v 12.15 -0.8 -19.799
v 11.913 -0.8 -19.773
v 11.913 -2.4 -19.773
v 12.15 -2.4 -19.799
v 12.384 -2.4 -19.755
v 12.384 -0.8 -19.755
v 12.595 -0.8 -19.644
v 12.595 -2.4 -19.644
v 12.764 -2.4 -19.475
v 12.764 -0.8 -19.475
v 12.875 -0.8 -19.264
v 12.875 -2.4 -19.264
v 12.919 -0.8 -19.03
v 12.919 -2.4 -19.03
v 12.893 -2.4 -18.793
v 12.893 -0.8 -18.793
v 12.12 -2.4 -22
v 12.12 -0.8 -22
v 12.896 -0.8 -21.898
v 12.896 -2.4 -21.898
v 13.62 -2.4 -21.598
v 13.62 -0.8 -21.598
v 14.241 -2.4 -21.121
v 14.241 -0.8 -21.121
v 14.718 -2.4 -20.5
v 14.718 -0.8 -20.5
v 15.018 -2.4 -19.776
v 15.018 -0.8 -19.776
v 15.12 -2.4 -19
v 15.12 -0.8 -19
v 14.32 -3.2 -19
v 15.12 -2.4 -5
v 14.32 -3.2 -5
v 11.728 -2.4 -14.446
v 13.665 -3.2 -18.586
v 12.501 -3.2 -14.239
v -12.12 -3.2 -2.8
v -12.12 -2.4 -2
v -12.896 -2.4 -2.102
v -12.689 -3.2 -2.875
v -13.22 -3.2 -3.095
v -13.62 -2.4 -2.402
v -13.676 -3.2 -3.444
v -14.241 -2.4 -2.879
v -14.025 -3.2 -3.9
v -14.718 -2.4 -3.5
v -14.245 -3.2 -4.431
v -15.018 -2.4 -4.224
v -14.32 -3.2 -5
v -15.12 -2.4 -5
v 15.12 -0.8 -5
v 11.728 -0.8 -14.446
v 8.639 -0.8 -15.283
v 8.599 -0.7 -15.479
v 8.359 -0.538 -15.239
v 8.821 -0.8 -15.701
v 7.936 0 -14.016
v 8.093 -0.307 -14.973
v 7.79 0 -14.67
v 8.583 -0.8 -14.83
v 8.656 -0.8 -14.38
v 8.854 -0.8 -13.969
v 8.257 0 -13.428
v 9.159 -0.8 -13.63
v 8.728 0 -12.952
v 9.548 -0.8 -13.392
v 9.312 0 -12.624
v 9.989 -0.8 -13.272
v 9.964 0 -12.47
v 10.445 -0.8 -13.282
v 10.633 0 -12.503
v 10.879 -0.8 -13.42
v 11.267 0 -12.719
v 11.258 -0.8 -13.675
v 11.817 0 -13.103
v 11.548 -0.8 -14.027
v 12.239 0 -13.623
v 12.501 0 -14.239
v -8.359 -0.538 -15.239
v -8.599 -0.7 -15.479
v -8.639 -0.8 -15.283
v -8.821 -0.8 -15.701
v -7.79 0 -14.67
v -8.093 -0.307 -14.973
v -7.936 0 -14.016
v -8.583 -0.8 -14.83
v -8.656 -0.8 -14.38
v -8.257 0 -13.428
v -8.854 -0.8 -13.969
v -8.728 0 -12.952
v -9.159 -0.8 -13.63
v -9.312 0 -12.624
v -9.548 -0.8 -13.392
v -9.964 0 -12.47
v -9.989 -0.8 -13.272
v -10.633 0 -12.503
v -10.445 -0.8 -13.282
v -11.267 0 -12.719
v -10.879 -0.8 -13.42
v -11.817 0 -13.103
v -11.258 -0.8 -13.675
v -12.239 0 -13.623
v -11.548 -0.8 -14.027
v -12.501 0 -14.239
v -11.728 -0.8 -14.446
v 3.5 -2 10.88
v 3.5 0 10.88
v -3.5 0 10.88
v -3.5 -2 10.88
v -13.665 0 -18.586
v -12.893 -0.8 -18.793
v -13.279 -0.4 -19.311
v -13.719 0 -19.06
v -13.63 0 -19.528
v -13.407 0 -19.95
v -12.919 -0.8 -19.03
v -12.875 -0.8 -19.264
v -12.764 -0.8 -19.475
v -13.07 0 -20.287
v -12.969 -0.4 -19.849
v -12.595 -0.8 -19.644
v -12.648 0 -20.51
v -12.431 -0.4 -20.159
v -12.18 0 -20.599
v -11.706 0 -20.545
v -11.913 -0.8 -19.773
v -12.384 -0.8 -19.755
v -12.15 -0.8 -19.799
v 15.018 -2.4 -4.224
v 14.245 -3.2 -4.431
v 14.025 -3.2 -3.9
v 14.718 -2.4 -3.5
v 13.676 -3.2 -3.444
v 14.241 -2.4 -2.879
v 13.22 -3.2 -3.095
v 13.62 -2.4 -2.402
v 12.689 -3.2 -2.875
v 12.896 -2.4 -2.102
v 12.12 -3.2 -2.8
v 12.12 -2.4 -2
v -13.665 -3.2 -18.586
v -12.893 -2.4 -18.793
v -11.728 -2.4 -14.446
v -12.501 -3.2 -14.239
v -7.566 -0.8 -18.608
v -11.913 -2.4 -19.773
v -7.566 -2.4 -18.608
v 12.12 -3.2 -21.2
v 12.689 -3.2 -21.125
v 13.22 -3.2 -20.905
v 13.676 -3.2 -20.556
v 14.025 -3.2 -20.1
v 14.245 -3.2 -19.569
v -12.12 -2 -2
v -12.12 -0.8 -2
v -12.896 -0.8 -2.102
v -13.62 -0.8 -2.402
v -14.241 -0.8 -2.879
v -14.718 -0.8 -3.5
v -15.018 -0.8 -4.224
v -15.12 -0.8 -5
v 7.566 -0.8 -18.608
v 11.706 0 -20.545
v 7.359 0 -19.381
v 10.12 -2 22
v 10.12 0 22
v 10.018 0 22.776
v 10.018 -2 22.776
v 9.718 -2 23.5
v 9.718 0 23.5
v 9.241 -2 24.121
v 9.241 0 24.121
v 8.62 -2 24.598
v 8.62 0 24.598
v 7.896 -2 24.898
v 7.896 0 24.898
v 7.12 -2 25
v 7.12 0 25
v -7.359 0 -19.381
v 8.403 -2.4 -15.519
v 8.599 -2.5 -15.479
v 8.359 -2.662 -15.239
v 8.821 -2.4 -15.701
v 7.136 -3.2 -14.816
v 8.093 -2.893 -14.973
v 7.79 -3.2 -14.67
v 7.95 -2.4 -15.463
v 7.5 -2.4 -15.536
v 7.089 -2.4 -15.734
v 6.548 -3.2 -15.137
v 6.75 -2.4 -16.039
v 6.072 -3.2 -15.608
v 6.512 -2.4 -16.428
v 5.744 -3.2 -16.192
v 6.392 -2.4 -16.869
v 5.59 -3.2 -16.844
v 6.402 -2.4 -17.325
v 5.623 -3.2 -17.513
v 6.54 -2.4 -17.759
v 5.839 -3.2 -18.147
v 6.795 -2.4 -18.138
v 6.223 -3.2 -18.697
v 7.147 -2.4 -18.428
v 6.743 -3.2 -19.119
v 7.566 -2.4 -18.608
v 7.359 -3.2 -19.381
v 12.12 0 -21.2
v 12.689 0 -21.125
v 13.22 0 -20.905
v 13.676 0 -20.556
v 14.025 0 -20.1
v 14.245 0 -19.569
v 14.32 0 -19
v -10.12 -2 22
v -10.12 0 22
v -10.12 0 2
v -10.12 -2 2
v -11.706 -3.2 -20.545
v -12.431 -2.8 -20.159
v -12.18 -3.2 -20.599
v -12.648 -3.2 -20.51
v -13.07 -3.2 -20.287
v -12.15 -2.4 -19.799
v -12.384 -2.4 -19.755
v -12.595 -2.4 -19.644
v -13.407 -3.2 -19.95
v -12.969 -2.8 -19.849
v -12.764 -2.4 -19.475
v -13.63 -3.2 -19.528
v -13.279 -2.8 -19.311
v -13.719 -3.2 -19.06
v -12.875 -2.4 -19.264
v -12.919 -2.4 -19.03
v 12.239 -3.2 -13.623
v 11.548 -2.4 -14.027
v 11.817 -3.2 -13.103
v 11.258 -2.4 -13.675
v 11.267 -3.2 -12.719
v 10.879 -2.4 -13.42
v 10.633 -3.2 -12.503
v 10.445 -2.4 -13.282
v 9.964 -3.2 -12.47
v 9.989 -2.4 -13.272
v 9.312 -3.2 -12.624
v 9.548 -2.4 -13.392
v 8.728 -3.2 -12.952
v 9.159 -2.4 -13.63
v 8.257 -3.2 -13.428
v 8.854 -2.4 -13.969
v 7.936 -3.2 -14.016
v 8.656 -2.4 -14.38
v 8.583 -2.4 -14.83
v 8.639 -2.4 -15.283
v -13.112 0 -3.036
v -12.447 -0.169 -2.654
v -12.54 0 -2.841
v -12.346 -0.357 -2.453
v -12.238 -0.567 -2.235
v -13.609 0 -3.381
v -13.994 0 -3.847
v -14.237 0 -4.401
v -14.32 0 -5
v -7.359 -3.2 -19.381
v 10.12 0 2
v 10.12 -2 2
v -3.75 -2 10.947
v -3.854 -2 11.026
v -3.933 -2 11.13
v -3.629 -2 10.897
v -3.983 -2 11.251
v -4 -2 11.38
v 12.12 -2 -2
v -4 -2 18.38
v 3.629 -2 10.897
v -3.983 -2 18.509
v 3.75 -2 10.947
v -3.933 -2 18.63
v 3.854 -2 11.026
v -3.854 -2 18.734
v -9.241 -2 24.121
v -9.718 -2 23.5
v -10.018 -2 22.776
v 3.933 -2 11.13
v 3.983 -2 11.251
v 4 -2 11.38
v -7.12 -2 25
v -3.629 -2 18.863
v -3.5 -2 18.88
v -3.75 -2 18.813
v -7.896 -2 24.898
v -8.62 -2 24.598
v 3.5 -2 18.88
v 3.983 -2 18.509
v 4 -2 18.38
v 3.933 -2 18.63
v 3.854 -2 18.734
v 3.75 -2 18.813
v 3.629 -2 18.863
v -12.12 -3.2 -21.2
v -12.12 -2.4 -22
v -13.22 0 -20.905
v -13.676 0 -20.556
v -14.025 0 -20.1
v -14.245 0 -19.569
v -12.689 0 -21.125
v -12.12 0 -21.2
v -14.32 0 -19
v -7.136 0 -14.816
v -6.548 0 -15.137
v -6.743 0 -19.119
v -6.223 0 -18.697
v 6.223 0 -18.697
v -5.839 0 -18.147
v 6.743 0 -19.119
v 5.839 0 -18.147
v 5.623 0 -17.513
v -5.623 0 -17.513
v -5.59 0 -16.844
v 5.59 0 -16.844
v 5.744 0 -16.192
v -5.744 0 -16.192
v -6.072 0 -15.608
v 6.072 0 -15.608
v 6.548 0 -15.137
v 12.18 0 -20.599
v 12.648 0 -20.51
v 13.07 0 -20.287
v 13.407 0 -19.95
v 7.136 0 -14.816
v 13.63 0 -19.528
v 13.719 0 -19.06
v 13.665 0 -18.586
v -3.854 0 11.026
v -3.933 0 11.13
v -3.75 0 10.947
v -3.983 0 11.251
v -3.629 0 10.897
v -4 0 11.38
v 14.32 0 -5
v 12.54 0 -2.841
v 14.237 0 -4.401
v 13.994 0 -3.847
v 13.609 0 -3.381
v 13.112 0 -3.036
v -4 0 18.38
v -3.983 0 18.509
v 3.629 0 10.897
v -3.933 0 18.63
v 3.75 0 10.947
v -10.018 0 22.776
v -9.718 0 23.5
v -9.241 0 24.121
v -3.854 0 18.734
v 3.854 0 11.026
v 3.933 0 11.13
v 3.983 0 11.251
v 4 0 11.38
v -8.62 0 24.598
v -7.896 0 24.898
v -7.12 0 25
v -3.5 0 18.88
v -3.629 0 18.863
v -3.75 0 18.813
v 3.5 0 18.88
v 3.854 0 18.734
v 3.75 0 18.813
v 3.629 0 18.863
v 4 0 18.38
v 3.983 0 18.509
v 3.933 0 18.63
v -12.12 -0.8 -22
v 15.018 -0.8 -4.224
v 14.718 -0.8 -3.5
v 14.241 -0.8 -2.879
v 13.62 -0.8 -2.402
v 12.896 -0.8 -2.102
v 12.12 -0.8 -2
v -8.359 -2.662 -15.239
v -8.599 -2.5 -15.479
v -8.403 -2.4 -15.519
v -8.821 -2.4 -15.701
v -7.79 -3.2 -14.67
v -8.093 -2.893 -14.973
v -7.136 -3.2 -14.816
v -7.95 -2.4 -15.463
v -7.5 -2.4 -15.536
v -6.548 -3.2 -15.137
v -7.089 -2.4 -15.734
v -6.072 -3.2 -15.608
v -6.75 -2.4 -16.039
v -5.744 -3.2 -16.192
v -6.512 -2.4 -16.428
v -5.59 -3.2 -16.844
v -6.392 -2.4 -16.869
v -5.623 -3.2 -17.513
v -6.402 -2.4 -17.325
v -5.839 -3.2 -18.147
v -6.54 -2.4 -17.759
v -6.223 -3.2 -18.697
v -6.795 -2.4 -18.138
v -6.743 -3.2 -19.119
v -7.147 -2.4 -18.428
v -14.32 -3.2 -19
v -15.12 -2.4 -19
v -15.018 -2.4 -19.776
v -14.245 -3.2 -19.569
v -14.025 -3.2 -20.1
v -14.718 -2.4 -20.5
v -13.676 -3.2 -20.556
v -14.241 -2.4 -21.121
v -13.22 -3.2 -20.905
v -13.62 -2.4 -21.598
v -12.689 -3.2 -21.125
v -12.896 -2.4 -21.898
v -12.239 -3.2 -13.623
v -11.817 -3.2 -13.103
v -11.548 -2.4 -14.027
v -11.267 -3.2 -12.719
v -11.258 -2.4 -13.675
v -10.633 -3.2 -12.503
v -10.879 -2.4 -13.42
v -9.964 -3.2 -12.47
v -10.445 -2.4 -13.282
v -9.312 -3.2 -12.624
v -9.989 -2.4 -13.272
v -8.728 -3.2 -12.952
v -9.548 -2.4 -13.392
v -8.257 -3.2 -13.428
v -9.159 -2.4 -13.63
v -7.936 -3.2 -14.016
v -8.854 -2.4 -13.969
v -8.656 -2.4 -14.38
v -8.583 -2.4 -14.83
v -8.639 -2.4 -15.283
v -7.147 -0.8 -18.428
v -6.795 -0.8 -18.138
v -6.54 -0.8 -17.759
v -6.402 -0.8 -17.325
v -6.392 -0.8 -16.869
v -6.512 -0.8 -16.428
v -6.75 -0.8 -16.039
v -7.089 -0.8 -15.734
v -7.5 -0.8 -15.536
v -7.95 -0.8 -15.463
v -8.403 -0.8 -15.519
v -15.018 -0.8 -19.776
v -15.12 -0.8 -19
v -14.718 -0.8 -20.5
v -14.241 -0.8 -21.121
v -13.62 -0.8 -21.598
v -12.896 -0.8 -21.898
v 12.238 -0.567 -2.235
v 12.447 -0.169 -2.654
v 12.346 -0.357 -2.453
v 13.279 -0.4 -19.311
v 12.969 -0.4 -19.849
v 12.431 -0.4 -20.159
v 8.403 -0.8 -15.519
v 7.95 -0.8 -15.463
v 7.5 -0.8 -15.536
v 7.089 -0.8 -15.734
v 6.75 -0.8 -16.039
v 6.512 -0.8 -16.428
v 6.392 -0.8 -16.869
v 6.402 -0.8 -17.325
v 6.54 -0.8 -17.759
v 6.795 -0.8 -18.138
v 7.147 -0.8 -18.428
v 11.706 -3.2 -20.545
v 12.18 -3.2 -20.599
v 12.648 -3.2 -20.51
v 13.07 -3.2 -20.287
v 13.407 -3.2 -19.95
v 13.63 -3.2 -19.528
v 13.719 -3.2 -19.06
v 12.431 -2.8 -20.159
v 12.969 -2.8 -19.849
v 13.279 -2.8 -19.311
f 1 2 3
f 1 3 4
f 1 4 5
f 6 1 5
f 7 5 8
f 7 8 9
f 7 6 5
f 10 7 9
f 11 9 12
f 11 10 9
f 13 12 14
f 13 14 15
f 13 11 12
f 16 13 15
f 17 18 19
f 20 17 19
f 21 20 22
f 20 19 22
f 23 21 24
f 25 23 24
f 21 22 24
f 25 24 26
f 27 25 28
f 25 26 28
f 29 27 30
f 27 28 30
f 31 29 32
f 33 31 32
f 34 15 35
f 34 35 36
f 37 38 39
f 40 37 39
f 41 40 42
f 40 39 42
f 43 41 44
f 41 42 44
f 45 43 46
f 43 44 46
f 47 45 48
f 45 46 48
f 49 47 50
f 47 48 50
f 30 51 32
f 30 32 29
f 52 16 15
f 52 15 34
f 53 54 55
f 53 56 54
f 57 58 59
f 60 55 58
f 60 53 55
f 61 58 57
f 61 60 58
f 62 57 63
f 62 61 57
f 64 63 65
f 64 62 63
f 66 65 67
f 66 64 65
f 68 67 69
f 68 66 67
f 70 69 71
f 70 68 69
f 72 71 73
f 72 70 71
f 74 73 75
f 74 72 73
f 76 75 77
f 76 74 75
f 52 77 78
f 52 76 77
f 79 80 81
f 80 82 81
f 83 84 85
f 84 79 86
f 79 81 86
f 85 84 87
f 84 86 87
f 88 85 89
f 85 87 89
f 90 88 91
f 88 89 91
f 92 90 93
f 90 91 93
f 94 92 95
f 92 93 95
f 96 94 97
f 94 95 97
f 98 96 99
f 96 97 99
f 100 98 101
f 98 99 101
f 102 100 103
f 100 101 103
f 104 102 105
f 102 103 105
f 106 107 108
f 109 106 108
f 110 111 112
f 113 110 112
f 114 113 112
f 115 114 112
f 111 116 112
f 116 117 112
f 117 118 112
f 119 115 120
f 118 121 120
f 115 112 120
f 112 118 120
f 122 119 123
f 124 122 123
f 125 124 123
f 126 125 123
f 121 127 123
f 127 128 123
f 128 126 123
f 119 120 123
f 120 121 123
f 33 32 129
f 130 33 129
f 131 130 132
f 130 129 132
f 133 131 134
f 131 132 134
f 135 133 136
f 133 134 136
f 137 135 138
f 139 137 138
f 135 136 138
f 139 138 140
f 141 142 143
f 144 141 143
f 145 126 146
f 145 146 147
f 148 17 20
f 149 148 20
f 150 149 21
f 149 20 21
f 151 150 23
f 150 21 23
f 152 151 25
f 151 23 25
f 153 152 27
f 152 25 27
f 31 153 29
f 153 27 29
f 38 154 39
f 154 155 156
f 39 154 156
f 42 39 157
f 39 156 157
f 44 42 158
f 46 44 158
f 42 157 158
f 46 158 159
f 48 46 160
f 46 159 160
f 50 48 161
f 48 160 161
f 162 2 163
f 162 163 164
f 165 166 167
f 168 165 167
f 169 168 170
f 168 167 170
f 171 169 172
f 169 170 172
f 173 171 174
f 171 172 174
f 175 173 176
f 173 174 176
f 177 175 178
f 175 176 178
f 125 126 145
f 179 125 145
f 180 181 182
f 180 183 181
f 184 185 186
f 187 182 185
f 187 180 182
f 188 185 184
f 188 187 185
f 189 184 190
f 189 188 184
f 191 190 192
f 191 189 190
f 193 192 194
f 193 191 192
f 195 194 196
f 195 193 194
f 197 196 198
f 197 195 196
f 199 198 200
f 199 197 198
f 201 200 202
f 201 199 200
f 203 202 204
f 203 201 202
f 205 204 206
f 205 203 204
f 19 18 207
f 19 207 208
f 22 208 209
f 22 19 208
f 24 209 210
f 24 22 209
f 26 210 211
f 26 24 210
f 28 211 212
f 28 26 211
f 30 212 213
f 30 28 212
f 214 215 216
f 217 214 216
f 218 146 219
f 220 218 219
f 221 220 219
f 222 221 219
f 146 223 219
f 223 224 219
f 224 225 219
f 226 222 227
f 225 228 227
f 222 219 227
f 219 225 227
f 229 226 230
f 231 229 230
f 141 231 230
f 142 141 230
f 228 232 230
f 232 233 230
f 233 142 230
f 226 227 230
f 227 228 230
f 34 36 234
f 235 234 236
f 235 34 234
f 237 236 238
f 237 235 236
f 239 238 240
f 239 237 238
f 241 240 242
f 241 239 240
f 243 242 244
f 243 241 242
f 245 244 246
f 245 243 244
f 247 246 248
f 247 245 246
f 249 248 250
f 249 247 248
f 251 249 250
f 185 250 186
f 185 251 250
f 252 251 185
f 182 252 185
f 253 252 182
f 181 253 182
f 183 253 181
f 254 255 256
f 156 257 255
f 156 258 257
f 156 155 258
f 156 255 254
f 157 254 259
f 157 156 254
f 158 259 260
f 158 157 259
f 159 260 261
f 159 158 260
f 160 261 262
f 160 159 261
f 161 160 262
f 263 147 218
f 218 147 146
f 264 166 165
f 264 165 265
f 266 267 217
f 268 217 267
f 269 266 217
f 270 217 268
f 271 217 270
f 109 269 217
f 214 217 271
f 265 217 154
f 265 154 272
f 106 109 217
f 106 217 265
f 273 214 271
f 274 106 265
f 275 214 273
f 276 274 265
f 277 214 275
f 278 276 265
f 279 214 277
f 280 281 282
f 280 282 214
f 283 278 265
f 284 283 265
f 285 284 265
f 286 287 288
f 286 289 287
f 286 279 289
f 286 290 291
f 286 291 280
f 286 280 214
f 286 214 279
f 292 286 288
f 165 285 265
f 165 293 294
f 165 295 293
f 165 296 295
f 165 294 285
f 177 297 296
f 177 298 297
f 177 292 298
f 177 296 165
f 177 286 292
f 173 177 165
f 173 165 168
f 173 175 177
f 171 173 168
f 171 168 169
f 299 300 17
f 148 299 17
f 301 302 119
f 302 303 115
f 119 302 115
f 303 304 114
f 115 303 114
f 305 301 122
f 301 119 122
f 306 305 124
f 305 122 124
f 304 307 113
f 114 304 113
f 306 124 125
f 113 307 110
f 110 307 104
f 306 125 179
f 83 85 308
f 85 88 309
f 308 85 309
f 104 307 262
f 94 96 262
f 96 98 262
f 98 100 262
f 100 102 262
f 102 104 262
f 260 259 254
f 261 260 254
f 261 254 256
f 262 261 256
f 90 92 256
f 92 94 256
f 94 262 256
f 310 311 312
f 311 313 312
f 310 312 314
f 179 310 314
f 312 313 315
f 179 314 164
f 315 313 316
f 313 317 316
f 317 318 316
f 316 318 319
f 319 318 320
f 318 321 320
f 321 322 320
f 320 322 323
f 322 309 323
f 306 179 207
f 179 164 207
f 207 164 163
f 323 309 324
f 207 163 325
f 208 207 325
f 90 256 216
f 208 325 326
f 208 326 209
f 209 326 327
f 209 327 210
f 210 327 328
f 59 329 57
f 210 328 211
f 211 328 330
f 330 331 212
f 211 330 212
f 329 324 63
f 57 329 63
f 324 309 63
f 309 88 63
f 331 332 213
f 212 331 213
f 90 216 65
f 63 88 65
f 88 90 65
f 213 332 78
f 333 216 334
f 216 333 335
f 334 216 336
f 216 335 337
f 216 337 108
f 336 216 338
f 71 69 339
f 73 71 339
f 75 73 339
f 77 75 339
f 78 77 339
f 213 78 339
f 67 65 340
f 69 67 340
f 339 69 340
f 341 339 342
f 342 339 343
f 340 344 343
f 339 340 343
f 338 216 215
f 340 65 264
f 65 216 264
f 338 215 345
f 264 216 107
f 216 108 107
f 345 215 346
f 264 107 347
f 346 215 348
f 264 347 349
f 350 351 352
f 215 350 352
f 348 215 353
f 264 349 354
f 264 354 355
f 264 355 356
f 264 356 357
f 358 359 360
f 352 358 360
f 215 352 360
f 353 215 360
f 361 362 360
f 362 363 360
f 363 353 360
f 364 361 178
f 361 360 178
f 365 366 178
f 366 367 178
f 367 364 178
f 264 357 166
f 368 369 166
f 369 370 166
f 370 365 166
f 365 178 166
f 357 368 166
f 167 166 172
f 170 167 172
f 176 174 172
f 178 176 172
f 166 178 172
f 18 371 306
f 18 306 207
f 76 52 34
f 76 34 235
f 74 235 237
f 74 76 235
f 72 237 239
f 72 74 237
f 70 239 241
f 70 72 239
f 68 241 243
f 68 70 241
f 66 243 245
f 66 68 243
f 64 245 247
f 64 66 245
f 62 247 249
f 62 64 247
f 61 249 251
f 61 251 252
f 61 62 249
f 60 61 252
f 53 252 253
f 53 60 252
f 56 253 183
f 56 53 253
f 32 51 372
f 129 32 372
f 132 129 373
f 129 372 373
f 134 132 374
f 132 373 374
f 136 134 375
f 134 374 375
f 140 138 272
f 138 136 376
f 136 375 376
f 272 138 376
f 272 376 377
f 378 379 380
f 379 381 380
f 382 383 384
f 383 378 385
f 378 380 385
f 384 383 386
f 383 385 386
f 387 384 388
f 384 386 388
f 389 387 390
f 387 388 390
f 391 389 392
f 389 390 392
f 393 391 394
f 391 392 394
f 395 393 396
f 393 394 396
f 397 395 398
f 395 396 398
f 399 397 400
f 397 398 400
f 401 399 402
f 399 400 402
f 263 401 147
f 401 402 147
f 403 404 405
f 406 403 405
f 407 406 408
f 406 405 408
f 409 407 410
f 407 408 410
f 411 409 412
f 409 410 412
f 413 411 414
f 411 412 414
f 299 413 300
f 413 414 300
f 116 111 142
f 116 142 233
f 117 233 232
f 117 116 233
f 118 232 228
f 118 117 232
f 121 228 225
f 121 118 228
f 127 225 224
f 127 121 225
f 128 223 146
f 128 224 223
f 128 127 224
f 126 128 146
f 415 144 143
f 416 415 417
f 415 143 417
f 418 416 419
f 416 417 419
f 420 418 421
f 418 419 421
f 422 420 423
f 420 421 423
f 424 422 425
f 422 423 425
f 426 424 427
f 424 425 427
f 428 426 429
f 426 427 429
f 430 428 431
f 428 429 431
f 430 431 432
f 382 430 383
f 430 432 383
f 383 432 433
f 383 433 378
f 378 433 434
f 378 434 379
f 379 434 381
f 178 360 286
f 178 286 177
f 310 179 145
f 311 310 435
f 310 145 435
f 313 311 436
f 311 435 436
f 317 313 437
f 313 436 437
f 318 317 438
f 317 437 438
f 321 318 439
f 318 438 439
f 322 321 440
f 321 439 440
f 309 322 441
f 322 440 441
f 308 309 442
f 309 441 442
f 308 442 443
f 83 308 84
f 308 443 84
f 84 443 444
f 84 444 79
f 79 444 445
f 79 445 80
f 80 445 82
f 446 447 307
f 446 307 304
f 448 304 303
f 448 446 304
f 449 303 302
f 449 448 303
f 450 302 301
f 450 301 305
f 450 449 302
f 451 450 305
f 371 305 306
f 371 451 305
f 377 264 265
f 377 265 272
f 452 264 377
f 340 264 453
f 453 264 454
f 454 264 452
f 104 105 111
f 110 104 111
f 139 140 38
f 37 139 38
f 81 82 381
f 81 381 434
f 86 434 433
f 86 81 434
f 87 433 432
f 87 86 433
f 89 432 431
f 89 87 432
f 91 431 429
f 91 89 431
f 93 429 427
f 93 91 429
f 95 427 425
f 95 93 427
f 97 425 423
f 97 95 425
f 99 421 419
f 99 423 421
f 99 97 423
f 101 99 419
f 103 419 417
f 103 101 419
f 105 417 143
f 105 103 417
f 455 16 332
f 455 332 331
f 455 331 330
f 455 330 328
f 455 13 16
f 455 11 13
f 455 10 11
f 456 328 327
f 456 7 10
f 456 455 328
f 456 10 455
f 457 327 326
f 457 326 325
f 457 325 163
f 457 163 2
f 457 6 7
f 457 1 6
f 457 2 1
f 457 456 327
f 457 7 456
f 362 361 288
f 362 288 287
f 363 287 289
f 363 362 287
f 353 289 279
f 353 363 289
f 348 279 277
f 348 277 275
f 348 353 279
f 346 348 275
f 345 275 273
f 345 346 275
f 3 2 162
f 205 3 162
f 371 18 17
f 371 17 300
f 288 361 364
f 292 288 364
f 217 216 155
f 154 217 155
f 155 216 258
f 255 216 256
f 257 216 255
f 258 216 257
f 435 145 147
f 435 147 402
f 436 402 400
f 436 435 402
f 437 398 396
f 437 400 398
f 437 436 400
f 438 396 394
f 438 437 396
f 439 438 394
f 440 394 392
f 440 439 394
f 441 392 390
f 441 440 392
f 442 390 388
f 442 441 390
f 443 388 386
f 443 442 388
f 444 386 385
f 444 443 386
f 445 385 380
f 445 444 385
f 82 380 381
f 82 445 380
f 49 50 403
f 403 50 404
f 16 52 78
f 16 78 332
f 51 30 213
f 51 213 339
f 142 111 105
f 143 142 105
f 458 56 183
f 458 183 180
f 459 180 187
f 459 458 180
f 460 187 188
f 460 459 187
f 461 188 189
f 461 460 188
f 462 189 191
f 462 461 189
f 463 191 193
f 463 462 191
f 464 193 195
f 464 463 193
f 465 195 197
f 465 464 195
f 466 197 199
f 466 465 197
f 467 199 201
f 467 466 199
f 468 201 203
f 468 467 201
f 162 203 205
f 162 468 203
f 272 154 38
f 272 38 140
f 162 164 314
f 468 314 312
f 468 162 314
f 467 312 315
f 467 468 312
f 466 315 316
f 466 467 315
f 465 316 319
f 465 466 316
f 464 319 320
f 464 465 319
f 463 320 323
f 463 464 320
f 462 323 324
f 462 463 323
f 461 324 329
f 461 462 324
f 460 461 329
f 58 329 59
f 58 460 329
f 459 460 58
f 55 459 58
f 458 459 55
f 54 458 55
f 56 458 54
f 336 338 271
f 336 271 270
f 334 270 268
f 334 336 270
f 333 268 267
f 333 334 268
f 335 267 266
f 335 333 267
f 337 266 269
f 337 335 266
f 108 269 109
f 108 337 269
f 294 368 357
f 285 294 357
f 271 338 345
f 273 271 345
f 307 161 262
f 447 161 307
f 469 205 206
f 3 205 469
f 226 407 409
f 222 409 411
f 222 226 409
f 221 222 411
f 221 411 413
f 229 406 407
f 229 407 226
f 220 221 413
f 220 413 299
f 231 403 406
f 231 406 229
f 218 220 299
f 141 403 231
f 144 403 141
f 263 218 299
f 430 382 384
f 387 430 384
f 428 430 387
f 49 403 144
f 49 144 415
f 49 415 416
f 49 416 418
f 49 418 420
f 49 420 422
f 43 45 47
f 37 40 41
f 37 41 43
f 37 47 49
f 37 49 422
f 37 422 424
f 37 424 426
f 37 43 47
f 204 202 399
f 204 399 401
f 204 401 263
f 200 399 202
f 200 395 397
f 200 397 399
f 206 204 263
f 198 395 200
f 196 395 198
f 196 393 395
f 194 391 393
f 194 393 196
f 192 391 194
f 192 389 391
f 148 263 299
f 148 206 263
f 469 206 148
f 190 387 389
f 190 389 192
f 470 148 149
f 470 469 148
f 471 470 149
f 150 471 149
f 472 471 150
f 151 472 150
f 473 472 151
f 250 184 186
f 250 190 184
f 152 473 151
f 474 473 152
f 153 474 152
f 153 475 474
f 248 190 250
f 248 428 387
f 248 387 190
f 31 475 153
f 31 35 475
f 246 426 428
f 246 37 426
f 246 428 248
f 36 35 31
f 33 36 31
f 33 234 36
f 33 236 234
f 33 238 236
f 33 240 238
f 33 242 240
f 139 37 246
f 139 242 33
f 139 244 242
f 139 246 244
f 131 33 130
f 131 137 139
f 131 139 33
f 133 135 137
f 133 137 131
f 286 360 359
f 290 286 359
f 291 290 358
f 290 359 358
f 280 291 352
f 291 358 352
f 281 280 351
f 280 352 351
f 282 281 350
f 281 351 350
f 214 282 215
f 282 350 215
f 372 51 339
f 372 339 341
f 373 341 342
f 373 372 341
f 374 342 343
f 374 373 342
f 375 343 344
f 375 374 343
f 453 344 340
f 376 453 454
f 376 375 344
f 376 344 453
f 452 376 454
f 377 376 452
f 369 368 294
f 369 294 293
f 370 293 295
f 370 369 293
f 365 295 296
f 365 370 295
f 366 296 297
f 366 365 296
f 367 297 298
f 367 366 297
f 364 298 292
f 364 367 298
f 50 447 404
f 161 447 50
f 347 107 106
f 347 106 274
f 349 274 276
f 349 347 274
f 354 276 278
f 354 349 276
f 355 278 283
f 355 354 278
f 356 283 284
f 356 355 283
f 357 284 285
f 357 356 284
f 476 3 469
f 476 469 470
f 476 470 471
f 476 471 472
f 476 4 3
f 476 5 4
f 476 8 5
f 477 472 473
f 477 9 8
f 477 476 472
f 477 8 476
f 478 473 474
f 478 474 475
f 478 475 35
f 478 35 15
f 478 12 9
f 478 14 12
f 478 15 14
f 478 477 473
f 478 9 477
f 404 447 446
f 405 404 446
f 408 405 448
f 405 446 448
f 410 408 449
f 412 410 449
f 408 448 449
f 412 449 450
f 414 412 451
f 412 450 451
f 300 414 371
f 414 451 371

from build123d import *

# Parameters (mm, degrees)
PAD013_DEPTH    = 2
PAD014_DEPTH    = 1.2
POCKET011_DEPTH = 3.201
CHAMFER010_SIZE = 0.8


with BuildPart() as part:
    # Sketch034 → Pad013 (new body)
    with BuildSketch(Plane.XZ):
        with BuildLine():
            ThreePointArc((-7.12, 25), (-9.24132, 24.12132), (-10.12, 22))
            Line((-10.12, 22), (-10.12, 2))
            Line((-10.12, 2), (-12.12, -2))
            ThreePointArc((-12.12, -2), (-14.24132, -2.87868), (-15.12, -5))
            Line((-15.12, -5), (-15.12, -19))
            ThreePointArc((-15.12, -19), (-14.24132, -21.12132), (-12.12, -22))
            Line((-12.12, -22), (12.12, -22))
            ThreePointArc((12.12, -22), (14.24132, -21.12132), (15.12, -19))
            Line((15.12, -19), (15.12, -5))
            ThreePointArc((15.12, -5), (14.24132, -2.87868), (12.12, -2))
            Line((10.12, 2), (12.12, -2))
            Line((10.12, 22), (10.12, 2))
            ThreePointArc((10.12, 22), (9.24132, 24.12132), (7.12, 25))
            Line((-7.12, 25), (7.12, 25))
        make_face()
        with BuildLine():
            Line((-3.5, 18.88), (3.5, 18.88))
            ThreePointArc((4, 18.38), (3.853553, 18.733553), (3.5, 18.88))
            Line((4, 18.38), (4, 11.38))
            ThreePointArc((3.5, 10.88), (3.853553, 11.026447), (4, 11.38))
            Line((3.5, 10.88), (-3.5, 10.88))
            ThreePointArc((-4, 11.38), (-3.853553, 11.026447), (-3.5, 10.88))
            Line((-4, 11.38), (-4, 18.38))
            ThreePointArc((-3.5, 18.88), (-3.853553, 18.733553), (-4, 18.38))
        make_face(mode=Mode.SUBTRACT)
    extrude(amount=PAD013_DEPTH)

    # Sketch035 → Pad014 (join)
    with BuildSketch(Plane.XZ.offset(2)):
        with BuildLine():
            ThreePointArc((15.12, -5), (14.24132, -2.87868), (12.12, -2))
            Line((-12.12, -2), (12.12, -2))
            ThreePointArc((-12.12, -2), (-14.24132, -2.87868), (-15.12, -5))
            Line((-15.12, -19), (-15.12, -5))
            ThreePointArc((-15.12, -19), (-14.24132, -21.12132), (-12.12, -22))
            Line((12.12, -22), (-12.12, -22))
            ThreePointArc((12.12, -22), (14.24132, -21.12132), (15.12, -19))
            Line((15.12, -5), (15.12, -19))
        make_face()
    extrude(amount=PAD014_DEPTH)

    # Sketch062 → Pocket011 (cut, through all)
    with BuildSketch(Plane.XZ):
        with BuildLine():
            ThreePointArc((-12.892741, -18.792945), (-12.685685, -19.565685), (-11.912945, -19.772741))
            Line((-11.912945, -19.772741), (-7.566279, -18.608055))
            ThreePointArc((-7.566279, -18.608055), (-6.511508, -16.428232), (-8.82149, -15.70149))
            ThreePointArc((-8.82149, -15.70149), (-9.548232, -13.391508), (-11.728055, -14.446279))
            Line((-12.892741, -18.792945), (-11.728055, -14.446279))
        make_face()
        with BuildLine():
            ThreePointArc((11.912945, -19.772741), (12.685685, -19.565685), (12.892741, -18.792945))
            Line((12.892741, -18.792945), (11.728055, -14.446279))
            ThreePointArc((11.728055, -14.446279), (9.548232, -13.391508), (8.82149, -15.70149))
            ThreePointArc((8.82149, -15.70149), (6.511508, -16.428232), (7.566279, -18.608055))
            Line((11.912945, -19.772741), (7.566279, -18.608055))
        make_face()
    extrude(amount=POCKET011_DEPTH, mode=Mode.SUBTRACT)

    # Chamfer010
    chamfer010_edges = [part.edges().sort_by_distance(p)[0] for p in [
        (-12.685685, 0, -19.565685),
        (-11.912945, -1.6, -19.772741),
        (-12.685685, -3.2, -19.565685),
        (-12.892741, -1.6, -18.792945),
        (9.739612, 0, -19.190398),
        (7.566279, -1.6, -18.608055),
        (9.739612, -3.2, -19.190398),
        (11.912945, -1.6, -19.772741),
        (0, 0, -22),
        (-14.24132, -3.2, -21.12132),
    ]]
    chamfer(chamfer010_edges, length=CHAMFER010_SIZE)


solid = part.part
